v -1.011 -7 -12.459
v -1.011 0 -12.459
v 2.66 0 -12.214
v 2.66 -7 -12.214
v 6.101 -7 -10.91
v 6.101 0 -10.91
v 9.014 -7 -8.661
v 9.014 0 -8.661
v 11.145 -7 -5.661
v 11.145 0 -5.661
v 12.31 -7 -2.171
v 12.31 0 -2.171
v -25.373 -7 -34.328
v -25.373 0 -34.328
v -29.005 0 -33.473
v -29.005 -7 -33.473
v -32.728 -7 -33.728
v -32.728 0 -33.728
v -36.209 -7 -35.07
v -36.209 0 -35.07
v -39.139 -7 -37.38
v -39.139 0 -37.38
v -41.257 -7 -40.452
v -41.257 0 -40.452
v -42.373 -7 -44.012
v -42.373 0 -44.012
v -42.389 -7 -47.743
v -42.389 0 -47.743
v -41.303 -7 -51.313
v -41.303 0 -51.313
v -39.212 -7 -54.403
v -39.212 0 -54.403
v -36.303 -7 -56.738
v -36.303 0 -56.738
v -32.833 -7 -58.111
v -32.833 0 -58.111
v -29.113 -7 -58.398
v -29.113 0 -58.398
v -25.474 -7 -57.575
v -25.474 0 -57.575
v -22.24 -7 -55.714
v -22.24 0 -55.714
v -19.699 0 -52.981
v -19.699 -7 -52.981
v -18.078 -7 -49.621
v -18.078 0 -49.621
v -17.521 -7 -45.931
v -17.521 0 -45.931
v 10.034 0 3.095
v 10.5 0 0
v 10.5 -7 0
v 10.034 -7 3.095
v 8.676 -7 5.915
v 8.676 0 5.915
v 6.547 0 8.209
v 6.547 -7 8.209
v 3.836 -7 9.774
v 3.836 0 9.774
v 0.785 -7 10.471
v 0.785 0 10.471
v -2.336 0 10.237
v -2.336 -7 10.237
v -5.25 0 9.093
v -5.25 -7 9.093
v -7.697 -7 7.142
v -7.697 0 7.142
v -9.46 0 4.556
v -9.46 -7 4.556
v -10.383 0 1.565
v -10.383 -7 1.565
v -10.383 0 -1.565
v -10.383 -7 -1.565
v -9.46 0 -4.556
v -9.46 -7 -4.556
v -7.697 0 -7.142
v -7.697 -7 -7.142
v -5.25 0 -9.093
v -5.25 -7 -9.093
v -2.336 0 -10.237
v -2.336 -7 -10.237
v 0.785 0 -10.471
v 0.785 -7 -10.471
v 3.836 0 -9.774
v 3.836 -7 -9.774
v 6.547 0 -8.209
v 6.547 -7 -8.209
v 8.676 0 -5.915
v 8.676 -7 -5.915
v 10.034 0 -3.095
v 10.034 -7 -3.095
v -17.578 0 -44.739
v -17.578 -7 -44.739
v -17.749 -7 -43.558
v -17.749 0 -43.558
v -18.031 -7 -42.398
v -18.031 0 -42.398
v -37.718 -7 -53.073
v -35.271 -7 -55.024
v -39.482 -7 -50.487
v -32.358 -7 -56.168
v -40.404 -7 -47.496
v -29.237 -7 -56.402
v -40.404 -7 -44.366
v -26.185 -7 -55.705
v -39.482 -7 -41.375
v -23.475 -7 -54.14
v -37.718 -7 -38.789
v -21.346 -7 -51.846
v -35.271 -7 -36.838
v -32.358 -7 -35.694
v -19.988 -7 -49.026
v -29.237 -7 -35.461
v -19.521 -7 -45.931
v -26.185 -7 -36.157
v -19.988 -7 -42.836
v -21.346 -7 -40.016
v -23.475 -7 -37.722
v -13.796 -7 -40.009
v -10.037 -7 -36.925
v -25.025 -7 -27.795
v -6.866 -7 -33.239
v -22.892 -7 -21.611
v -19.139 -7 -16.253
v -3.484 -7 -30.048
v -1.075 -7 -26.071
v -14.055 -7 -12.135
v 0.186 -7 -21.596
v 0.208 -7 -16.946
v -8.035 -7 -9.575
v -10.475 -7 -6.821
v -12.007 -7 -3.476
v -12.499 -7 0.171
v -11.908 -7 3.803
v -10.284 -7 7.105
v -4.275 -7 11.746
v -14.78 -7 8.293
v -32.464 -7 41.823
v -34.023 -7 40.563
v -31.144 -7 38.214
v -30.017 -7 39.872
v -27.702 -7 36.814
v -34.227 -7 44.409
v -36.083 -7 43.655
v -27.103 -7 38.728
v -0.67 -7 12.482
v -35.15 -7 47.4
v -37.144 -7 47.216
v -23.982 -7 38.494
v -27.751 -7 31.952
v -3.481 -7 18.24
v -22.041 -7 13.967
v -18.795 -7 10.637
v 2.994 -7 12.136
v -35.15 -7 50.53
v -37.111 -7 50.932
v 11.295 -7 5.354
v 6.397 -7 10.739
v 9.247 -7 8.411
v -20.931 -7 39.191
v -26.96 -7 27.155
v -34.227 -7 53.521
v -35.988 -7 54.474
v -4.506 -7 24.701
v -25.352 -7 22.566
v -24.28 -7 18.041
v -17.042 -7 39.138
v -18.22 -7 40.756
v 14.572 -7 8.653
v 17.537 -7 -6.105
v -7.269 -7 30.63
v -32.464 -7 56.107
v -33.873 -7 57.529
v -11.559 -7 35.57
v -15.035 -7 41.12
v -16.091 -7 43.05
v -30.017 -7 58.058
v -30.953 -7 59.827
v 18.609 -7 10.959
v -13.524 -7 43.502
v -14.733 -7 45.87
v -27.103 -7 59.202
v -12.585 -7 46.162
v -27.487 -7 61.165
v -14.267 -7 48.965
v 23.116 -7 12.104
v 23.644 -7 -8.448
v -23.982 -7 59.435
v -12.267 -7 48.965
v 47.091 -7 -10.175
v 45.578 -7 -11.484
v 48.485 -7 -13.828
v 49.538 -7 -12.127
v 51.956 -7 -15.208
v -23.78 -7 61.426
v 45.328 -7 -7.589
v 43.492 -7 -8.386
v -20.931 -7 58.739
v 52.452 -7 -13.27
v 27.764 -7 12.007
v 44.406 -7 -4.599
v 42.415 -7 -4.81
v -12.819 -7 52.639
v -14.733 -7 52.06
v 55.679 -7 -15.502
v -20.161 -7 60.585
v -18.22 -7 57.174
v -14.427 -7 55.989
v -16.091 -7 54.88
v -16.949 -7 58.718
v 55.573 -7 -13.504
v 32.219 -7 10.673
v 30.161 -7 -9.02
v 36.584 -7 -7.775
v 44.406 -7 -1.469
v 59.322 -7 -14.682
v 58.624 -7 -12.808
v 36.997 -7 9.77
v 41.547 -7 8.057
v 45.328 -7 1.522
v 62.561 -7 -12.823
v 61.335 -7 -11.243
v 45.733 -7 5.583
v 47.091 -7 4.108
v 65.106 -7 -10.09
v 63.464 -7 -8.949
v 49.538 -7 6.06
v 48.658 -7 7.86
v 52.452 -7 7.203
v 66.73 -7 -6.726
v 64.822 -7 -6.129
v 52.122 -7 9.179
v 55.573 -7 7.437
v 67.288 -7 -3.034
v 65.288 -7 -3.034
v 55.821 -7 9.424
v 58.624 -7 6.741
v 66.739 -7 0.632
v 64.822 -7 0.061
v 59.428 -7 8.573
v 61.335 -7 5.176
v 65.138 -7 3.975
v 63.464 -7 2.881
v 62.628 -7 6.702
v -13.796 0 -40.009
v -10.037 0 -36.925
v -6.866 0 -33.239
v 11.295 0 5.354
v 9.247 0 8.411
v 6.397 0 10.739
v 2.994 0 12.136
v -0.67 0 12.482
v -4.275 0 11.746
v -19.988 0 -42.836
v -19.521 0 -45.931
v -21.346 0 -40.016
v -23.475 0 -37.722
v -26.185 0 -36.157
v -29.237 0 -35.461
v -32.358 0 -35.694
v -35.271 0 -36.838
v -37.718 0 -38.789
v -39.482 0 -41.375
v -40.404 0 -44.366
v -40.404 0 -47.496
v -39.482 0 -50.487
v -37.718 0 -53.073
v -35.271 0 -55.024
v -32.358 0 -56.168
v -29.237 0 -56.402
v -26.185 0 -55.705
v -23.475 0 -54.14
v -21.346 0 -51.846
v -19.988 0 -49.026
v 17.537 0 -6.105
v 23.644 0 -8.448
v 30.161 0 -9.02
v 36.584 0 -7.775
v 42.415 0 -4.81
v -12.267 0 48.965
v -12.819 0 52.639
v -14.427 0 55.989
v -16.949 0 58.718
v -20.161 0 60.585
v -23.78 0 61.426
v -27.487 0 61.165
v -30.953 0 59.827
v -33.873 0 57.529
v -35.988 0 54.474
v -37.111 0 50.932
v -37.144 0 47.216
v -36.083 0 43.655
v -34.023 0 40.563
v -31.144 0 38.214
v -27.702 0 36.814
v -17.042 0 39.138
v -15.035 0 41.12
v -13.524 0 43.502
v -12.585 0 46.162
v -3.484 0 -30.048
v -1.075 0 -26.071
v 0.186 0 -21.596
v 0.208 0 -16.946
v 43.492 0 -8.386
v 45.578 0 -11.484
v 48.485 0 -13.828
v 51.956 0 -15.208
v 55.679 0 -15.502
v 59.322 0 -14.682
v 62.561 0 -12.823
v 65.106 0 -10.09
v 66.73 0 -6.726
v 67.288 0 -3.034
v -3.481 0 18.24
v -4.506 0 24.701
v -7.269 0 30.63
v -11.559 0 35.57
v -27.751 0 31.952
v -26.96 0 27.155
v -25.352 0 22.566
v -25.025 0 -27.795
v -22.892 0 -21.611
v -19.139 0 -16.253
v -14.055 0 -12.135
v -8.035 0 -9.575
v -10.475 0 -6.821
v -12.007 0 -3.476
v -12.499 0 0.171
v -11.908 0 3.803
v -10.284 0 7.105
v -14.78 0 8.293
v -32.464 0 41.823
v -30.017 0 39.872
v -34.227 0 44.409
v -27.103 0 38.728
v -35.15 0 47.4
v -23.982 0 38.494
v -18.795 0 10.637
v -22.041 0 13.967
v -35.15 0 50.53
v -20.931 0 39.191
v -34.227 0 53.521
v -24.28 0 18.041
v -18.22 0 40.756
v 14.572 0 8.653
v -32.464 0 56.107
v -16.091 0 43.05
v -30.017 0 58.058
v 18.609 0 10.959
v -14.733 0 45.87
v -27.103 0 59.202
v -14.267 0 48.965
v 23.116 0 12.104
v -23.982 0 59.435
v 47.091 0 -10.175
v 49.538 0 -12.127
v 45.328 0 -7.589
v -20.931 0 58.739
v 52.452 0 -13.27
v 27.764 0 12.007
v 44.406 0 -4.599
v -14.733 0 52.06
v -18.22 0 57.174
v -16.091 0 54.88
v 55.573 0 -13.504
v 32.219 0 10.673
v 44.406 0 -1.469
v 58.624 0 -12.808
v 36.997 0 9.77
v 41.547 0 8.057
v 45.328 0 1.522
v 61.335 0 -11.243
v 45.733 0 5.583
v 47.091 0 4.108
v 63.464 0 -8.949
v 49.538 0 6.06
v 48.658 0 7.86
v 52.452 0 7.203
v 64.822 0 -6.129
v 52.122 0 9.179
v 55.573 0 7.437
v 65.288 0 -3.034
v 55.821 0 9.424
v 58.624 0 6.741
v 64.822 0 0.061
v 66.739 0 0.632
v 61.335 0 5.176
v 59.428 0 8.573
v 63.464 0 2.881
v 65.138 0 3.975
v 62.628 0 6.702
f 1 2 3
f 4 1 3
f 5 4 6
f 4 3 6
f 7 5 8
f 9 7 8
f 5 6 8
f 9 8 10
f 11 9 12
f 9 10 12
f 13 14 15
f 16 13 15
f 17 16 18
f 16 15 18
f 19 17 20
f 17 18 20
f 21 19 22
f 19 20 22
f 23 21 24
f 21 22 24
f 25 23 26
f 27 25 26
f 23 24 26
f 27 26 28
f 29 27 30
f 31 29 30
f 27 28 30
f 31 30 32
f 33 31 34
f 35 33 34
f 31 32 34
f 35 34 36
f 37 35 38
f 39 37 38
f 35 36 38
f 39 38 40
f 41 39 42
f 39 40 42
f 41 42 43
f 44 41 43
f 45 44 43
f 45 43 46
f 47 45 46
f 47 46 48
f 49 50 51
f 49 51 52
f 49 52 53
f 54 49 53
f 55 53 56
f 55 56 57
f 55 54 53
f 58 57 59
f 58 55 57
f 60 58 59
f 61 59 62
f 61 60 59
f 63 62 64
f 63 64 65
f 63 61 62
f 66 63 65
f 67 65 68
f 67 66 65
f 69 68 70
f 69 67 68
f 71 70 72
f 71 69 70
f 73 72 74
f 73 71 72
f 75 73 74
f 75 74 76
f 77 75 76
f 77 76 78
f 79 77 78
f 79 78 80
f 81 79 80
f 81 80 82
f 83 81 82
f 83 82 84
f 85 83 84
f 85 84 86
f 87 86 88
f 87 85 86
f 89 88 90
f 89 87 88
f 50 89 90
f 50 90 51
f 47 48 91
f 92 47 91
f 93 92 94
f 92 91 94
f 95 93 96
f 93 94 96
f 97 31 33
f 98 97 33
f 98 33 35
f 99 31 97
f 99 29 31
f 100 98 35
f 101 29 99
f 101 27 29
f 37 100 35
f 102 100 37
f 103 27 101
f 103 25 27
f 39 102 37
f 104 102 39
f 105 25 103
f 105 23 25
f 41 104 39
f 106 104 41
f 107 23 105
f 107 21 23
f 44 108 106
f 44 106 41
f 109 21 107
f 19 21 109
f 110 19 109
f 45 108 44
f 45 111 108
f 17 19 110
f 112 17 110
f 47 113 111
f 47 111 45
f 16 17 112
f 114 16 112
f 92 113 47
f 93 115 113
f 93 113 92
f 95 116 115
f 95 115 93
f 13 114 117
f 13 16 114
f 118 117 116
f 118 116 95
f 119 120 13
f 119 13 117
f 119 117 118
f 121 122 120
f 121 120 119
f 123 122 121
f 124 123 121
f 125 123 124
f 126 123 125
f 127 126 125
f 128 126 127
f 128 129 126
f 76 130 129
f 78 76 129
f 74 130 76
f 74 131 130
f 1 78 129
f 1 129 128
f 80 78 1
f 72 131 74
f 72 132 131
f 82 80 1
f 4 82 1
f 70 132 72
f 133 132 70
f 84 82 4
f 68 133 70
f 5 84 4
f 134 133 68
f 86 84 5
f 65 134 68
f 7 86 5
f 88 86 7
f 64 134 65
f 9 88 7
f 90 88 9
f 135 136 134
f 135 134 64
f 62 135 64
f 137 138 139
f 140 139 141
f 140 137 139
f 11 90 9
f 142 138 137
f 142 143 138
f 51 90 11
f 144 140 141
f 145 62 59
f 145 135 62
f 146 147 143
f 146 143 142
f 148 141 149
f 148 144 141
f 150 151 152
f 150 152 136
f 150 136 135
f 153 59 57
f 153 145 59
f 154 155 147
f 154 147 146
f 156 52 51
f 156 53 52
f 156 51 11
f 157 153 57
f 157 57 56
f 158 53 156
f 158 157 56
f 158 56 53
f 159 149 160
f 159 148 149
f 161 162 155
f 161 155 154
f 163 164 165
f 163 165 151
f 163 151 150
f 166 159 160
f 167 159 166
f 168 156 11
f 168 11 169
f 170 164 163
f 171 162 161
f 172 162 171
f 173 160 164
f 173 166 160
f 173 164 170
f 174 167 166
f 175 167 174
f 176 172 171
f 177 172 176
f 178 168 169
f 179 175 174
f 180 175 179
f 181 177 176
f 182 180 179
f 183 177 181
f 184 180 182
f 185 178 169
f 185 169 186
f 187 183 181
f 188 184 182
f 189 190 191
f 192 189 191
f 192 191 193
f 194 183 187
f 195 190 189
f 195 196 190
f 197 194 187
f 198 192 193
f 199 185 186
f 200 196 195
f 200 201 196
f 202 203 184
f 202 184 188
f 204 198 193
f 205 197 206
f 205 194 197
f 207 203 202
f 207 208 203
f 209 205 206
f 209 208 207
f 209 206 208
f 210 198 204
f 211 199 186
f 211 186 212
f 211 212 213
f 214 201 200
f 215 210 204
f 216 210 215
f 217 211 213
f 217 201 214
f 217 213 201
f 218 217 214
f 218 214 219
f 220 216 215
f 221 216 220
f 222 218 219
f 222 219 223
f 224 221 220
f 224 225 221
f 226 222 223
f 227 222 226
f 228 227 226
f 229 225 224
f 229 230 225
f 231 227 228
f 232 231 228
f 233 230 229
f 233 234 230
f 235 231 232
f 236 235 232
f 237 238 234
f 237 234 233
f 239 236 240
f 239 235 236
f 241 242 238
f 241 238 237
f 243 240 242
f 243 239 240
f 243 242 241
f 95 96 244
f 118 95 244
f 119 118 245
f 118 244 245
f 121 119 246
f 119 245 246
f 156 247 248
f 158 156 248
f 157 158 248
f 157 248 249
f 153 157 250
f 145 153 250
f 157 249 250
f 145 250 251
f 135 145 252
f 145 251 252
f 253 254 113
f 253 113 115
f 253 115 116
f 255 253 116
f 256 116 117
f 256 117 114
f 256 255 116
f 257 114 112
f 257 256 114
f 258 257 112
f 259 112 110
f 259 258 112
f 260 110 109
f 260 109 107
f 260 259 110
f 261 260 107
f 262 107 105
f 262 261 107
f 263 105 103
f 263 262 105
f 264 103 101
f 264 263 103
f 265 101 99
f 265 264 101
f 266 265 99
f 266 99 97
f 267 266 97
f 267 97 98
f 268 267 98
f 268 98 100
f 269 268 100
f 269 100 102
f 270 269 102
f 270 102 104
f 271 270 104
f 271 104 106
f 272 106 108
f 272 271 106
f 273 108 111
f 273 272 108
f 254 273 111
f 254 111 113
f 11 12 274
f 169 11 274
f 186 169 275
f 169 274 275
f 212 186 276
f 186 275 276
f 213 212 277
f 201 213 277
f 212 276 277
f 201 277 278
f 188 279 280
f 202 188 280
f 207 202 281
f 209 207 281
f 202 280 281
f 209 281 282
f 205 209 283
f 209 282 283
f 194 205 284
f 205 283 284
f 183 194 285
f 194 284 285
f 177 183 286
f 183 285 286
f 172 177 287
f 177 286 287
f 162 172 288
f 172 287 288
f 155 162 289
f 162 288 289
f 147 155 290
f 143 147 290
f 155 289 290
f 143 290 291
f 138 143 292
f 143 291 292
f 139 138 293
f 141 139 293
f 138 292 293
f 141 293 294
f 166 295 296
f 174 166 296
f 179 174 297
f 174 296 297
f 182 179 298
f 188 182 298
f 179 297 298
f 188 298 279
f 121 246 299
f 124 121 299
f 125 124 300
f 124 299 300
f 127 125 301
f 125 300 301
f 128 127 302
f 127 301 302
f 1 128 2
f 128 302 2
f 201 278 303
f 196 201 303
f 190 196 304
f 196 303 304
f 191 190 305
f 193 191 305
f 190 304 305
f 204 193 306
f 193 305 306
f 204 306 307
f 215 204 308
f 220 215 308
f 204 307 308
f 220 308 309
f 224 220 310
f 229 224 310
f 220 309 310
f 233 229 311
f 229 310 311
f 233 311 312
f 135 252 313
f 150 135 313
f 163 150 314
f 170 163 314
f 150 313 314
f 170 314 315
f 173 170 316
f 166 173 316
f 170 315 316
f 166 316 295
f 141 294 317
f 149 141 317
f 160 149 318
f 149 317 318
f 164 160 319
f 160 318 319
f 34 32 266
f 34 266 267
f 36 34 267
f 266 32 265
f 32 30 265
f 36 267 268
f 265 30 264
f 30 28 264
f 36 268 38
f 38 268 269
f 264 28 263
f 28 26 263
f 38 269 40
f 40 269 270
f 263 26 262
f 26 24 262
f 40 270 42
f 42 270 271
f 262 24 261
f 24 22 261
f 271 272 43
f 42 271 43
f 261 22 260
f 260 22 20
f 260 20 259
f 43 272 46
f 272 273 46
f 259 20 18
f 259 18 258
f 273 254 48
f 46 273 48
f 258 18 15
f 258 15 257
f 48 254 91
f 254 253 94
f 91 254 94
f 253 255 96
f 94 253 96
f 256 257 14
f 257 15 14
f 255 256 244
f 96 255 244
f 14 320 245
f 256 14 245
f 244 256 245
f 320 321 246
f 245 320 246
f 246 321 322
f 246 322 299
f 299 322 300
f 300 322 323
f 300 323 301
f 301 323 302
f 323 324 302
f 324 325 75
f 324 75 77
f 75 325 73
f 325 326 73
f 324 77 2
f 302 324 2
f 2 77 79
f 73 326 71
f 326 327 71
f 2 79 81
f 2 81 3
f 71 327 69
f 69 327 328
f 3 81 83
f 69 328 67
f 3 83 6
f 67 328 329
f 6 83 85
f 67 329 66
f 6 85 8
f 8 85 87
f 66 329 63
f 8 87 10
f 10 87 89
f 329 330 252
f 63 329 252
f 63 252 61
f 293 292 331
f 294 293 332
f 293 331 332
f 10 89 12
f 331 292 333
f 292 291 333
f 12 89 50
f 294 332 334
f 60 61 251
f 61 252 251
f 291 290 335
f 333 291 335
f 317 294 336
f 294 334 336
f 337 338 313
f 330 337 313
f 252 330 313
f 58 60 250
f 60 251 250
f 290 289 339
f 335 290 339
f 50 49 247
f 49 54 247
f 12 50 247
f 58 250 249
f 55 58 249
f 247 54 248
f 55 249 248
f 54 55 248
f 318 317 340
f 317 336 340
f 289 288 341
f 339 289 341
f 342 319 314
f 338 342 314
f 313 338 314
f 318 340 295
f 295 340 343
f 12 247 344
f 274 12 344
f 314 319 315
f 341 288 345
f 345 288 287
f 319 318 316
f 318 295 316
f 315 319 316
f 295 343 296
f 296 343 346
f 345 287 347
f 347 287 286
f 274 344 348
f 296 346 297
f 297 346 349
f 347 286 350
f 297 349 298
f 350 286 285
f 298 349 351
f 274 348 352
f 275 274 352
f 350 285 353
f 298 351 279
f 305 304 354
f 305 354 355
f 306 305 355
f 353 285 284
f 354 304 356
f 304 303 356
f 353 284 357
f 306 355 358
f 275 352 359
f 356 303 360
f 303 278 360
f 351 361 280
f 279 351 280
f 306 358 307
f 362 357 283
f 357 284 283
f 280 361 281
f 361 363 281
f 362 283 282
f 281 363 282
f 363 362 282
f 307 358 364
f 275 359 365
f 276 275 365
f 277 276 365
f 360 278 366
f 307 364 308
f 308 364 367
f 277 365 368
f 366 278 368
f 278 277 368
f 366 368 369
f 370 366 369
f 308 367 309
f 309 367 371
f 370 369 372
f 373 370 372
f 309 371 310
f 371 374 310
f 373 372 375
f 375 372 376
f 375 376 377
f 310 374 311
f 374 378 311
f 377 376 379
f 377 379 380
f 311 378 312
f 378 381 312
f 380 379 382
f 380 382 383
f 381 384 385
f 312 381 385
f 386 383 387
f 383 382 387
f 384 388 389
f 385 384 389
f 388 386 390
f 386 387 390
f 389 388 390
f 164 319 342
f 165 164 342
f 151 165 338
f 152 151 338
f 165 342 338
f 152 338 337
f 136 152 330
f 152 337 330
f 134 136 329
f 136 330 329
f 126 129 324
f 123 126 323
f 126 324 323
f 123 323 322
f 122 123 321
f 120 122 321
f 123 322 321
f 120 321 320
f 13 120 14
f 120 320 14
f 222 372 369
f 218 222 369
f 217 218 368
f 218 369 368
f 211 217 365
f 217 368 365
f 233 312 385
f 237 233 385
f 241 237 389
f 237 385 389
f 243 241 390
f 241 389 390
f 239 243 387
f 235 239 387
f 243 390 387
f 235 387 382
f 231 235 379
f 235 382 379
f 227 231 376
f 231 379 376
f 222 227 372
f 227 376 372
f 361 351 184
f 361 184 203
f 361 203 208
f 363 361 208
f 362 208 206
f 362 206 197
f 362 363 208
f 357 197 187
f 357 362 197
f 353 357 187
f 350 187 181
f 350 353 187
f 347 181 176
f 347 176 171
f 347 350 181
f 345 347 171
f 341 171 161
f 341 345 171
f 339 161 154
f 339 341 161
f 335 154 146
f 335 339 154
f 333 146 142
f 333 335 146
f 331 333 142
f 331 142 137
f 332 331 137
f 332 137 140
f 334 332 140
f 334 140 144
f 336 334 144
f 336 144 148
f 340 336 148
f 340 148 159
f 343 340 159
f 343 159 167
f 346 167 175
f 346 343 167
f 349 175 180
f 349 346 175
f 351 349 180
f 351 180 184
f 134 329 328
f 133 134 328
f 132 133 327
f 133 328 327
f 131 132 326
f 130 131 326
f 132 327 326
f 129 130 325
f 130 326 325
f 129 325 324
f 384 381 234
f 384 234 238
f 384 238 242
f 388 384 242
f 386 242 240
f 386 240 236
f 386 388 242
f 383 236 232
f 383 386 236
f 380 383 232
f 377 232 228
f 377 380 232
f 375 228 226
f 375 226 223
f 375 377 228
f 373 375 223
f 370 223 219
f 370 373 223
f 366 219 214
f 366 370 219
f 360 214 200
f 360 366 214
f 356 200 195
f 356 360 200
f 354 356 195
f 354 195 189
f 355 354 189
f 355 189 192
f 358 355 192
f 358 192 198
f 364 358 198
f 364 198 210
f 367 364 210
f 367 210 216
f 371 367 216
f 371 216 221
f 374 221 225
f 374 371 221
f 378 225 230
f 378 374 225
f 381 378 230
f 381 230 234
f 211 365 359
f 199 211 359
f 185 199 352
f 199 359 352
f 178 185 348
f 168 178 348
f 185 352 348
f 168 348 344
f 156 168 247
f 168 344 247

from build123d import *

# Parameters (mm, degrees)
F0_R     = 10.5
F1_DEPTH = 7


with BuildPart() as f1:
    # F0 (on Front) → F1 (new body)
    with BuildSketch(Plane.XZ):
        with BuildLine():
            ThreePointArc((11.295326, 5.354027), (12.195113, 2.743941), (12.5, 0))
            ThreePointArc((12.5, 0), (12.452429, -1.089502), (12.310078, -2.170712))
            ThreePointArc((12.310078, -2.170712), (26.882949, -8.961501), (42.415141, -4.81007))
            ThreePointArc((42.415141, -4.81007), (42.880339, 0.767824), (45.733166, 5.583494))
            ThreePointArc((45.733166, 5.583494), (39.308861, 9.012266), (32.218698, 10.672916))
            ThreePointArc((32.218698, 10.672916), (20.823945, 11.683957), (11.295326, 5.354027))
        make_face()
        with BuildLine():
            ThreePointArc((45.733166, 5.583494), (42.880339, 0.767824), (42.415141, -4.81007))
            ThreePointArc((42.415141, -4.81007), (55.678745, -15.501888), (67.28827, -3.033646))
            ThreePointArc((67.28827, -3.033646), (59.428378, 8.573223), (45.733166, 5.583494))
        make_face()
        with Locations((54.78827, -3.033646)):
            Circle(F0_R, mode=Mode.SUBTRACT)
        with BuildLine():
            ThreePointArc((-27.702031, 36.814337), (-22.105124, 36.751551), (-17.041928, 39.137625))
            ThreePointArc((-17.041928, 39.137625), (-13.523869, 43.501909), (-12.266921, 48.964857))
            ThreePointArc((-12.266921, 48.964857), (-32.49871, 58.786742), (-27.702031, 36.814337))
        make_face()
        with Locations((-24.766921, 48.964857)):
            Circle(F0_R, mode=Mode.SUBTRACT)
        with BuildLine():
            ThreePointArc((-10.284387, 7.105026), (-7.640688, 9.892921), (-4.275147, 11.746196))
            ThreePointArc((-4.275147, 11.746196), (-5.680587, 27.762067), (-17.041928, 39.137625))
            ThreePointArc((-17.041928, 39.137625), (-22.105124, 36.751551), (-27.702031, 36.814337))
            ThreePointArc((-27.702031, 36.814337), (-27.459282, 29.53634), (-25.352365, 22.565753))
            ThreePointArc((-25.352365, 22.565753), (-20.530576, 12.192087), (-10.284387, 7.105026))
        make_face()
        with BuildLine():
            ThreePointArc((12.310078, -2.170712), (12.452429, -1.089502), (12.5, 0))
            ThreePointArc((12.5, 0), (12.195113, 2.743941), (11.295326, 5.354027))
            ThreePointArc((11.295326, 5.354027), (4.747176, 11.563491), (-4.275147, 11.746196))
            ThreePointArc((-4.275147, 11.746196), (-7.640688, 9.892921), (-10.284387, 7.105026))
            ThreePointArc((-10.284387, 7.105026), (-12.387865, -1.67057), (-8.034931, -9.575484))
            ThreePointArc((-8.034931, -9.575484), (-4.747176, -11.563491), (-1.01094, -12.459053))
            ThreePointArc((-1.01094, -12.459053), (7.640688, -9.892921), (12.310078, -2.170712))
        make_face()
        Circle(F0_R, mode=Mode.SUBTRACT)
        with BuildLine():
            ThreePointArc((-6.866333, -33.238669), (-0.293369, -23.876044), (-1.01094, -12.459053))
            ThreePointArc((-1.01094, -12.459053), (-4.747176, -11.563491), (-8.034931, -9.575484))
            ThreePointArc((-8.034931, -9.575484), (-21.202362, -18.800566), (-25.373214, -34.327555))
            ThreePointArc((-25.373214, -34.327555), (-20.775215, -37.519374), (-18.031136, -42.397831))
            ThreePointArc((-18.031136, -42.397831), (-11.849579, -38.548606), (-6.866333, -33.238669))
        make_face()
        with BuildLine():
            ThreePointArc((-18.031136, -42.397831), (-20.775215, -37.519374), (-25.373214, -34.327555))
            ThreePointArc((-25.373214, -34.327555), (-40.373926, -52.936505), (-17.521349, -45.931211))
            ThreePointArc((-17.521349, -45.931211), (-17.649452, -44.146228), (-18.031136, -42.397831))
        make_face()
        with Locations((-30.021349, -45.931211)):
            Circle(F0_R, mode=Mode.SUBTRACT)
    extrude(amount=F1_DEPTH)


solid = f1.part
